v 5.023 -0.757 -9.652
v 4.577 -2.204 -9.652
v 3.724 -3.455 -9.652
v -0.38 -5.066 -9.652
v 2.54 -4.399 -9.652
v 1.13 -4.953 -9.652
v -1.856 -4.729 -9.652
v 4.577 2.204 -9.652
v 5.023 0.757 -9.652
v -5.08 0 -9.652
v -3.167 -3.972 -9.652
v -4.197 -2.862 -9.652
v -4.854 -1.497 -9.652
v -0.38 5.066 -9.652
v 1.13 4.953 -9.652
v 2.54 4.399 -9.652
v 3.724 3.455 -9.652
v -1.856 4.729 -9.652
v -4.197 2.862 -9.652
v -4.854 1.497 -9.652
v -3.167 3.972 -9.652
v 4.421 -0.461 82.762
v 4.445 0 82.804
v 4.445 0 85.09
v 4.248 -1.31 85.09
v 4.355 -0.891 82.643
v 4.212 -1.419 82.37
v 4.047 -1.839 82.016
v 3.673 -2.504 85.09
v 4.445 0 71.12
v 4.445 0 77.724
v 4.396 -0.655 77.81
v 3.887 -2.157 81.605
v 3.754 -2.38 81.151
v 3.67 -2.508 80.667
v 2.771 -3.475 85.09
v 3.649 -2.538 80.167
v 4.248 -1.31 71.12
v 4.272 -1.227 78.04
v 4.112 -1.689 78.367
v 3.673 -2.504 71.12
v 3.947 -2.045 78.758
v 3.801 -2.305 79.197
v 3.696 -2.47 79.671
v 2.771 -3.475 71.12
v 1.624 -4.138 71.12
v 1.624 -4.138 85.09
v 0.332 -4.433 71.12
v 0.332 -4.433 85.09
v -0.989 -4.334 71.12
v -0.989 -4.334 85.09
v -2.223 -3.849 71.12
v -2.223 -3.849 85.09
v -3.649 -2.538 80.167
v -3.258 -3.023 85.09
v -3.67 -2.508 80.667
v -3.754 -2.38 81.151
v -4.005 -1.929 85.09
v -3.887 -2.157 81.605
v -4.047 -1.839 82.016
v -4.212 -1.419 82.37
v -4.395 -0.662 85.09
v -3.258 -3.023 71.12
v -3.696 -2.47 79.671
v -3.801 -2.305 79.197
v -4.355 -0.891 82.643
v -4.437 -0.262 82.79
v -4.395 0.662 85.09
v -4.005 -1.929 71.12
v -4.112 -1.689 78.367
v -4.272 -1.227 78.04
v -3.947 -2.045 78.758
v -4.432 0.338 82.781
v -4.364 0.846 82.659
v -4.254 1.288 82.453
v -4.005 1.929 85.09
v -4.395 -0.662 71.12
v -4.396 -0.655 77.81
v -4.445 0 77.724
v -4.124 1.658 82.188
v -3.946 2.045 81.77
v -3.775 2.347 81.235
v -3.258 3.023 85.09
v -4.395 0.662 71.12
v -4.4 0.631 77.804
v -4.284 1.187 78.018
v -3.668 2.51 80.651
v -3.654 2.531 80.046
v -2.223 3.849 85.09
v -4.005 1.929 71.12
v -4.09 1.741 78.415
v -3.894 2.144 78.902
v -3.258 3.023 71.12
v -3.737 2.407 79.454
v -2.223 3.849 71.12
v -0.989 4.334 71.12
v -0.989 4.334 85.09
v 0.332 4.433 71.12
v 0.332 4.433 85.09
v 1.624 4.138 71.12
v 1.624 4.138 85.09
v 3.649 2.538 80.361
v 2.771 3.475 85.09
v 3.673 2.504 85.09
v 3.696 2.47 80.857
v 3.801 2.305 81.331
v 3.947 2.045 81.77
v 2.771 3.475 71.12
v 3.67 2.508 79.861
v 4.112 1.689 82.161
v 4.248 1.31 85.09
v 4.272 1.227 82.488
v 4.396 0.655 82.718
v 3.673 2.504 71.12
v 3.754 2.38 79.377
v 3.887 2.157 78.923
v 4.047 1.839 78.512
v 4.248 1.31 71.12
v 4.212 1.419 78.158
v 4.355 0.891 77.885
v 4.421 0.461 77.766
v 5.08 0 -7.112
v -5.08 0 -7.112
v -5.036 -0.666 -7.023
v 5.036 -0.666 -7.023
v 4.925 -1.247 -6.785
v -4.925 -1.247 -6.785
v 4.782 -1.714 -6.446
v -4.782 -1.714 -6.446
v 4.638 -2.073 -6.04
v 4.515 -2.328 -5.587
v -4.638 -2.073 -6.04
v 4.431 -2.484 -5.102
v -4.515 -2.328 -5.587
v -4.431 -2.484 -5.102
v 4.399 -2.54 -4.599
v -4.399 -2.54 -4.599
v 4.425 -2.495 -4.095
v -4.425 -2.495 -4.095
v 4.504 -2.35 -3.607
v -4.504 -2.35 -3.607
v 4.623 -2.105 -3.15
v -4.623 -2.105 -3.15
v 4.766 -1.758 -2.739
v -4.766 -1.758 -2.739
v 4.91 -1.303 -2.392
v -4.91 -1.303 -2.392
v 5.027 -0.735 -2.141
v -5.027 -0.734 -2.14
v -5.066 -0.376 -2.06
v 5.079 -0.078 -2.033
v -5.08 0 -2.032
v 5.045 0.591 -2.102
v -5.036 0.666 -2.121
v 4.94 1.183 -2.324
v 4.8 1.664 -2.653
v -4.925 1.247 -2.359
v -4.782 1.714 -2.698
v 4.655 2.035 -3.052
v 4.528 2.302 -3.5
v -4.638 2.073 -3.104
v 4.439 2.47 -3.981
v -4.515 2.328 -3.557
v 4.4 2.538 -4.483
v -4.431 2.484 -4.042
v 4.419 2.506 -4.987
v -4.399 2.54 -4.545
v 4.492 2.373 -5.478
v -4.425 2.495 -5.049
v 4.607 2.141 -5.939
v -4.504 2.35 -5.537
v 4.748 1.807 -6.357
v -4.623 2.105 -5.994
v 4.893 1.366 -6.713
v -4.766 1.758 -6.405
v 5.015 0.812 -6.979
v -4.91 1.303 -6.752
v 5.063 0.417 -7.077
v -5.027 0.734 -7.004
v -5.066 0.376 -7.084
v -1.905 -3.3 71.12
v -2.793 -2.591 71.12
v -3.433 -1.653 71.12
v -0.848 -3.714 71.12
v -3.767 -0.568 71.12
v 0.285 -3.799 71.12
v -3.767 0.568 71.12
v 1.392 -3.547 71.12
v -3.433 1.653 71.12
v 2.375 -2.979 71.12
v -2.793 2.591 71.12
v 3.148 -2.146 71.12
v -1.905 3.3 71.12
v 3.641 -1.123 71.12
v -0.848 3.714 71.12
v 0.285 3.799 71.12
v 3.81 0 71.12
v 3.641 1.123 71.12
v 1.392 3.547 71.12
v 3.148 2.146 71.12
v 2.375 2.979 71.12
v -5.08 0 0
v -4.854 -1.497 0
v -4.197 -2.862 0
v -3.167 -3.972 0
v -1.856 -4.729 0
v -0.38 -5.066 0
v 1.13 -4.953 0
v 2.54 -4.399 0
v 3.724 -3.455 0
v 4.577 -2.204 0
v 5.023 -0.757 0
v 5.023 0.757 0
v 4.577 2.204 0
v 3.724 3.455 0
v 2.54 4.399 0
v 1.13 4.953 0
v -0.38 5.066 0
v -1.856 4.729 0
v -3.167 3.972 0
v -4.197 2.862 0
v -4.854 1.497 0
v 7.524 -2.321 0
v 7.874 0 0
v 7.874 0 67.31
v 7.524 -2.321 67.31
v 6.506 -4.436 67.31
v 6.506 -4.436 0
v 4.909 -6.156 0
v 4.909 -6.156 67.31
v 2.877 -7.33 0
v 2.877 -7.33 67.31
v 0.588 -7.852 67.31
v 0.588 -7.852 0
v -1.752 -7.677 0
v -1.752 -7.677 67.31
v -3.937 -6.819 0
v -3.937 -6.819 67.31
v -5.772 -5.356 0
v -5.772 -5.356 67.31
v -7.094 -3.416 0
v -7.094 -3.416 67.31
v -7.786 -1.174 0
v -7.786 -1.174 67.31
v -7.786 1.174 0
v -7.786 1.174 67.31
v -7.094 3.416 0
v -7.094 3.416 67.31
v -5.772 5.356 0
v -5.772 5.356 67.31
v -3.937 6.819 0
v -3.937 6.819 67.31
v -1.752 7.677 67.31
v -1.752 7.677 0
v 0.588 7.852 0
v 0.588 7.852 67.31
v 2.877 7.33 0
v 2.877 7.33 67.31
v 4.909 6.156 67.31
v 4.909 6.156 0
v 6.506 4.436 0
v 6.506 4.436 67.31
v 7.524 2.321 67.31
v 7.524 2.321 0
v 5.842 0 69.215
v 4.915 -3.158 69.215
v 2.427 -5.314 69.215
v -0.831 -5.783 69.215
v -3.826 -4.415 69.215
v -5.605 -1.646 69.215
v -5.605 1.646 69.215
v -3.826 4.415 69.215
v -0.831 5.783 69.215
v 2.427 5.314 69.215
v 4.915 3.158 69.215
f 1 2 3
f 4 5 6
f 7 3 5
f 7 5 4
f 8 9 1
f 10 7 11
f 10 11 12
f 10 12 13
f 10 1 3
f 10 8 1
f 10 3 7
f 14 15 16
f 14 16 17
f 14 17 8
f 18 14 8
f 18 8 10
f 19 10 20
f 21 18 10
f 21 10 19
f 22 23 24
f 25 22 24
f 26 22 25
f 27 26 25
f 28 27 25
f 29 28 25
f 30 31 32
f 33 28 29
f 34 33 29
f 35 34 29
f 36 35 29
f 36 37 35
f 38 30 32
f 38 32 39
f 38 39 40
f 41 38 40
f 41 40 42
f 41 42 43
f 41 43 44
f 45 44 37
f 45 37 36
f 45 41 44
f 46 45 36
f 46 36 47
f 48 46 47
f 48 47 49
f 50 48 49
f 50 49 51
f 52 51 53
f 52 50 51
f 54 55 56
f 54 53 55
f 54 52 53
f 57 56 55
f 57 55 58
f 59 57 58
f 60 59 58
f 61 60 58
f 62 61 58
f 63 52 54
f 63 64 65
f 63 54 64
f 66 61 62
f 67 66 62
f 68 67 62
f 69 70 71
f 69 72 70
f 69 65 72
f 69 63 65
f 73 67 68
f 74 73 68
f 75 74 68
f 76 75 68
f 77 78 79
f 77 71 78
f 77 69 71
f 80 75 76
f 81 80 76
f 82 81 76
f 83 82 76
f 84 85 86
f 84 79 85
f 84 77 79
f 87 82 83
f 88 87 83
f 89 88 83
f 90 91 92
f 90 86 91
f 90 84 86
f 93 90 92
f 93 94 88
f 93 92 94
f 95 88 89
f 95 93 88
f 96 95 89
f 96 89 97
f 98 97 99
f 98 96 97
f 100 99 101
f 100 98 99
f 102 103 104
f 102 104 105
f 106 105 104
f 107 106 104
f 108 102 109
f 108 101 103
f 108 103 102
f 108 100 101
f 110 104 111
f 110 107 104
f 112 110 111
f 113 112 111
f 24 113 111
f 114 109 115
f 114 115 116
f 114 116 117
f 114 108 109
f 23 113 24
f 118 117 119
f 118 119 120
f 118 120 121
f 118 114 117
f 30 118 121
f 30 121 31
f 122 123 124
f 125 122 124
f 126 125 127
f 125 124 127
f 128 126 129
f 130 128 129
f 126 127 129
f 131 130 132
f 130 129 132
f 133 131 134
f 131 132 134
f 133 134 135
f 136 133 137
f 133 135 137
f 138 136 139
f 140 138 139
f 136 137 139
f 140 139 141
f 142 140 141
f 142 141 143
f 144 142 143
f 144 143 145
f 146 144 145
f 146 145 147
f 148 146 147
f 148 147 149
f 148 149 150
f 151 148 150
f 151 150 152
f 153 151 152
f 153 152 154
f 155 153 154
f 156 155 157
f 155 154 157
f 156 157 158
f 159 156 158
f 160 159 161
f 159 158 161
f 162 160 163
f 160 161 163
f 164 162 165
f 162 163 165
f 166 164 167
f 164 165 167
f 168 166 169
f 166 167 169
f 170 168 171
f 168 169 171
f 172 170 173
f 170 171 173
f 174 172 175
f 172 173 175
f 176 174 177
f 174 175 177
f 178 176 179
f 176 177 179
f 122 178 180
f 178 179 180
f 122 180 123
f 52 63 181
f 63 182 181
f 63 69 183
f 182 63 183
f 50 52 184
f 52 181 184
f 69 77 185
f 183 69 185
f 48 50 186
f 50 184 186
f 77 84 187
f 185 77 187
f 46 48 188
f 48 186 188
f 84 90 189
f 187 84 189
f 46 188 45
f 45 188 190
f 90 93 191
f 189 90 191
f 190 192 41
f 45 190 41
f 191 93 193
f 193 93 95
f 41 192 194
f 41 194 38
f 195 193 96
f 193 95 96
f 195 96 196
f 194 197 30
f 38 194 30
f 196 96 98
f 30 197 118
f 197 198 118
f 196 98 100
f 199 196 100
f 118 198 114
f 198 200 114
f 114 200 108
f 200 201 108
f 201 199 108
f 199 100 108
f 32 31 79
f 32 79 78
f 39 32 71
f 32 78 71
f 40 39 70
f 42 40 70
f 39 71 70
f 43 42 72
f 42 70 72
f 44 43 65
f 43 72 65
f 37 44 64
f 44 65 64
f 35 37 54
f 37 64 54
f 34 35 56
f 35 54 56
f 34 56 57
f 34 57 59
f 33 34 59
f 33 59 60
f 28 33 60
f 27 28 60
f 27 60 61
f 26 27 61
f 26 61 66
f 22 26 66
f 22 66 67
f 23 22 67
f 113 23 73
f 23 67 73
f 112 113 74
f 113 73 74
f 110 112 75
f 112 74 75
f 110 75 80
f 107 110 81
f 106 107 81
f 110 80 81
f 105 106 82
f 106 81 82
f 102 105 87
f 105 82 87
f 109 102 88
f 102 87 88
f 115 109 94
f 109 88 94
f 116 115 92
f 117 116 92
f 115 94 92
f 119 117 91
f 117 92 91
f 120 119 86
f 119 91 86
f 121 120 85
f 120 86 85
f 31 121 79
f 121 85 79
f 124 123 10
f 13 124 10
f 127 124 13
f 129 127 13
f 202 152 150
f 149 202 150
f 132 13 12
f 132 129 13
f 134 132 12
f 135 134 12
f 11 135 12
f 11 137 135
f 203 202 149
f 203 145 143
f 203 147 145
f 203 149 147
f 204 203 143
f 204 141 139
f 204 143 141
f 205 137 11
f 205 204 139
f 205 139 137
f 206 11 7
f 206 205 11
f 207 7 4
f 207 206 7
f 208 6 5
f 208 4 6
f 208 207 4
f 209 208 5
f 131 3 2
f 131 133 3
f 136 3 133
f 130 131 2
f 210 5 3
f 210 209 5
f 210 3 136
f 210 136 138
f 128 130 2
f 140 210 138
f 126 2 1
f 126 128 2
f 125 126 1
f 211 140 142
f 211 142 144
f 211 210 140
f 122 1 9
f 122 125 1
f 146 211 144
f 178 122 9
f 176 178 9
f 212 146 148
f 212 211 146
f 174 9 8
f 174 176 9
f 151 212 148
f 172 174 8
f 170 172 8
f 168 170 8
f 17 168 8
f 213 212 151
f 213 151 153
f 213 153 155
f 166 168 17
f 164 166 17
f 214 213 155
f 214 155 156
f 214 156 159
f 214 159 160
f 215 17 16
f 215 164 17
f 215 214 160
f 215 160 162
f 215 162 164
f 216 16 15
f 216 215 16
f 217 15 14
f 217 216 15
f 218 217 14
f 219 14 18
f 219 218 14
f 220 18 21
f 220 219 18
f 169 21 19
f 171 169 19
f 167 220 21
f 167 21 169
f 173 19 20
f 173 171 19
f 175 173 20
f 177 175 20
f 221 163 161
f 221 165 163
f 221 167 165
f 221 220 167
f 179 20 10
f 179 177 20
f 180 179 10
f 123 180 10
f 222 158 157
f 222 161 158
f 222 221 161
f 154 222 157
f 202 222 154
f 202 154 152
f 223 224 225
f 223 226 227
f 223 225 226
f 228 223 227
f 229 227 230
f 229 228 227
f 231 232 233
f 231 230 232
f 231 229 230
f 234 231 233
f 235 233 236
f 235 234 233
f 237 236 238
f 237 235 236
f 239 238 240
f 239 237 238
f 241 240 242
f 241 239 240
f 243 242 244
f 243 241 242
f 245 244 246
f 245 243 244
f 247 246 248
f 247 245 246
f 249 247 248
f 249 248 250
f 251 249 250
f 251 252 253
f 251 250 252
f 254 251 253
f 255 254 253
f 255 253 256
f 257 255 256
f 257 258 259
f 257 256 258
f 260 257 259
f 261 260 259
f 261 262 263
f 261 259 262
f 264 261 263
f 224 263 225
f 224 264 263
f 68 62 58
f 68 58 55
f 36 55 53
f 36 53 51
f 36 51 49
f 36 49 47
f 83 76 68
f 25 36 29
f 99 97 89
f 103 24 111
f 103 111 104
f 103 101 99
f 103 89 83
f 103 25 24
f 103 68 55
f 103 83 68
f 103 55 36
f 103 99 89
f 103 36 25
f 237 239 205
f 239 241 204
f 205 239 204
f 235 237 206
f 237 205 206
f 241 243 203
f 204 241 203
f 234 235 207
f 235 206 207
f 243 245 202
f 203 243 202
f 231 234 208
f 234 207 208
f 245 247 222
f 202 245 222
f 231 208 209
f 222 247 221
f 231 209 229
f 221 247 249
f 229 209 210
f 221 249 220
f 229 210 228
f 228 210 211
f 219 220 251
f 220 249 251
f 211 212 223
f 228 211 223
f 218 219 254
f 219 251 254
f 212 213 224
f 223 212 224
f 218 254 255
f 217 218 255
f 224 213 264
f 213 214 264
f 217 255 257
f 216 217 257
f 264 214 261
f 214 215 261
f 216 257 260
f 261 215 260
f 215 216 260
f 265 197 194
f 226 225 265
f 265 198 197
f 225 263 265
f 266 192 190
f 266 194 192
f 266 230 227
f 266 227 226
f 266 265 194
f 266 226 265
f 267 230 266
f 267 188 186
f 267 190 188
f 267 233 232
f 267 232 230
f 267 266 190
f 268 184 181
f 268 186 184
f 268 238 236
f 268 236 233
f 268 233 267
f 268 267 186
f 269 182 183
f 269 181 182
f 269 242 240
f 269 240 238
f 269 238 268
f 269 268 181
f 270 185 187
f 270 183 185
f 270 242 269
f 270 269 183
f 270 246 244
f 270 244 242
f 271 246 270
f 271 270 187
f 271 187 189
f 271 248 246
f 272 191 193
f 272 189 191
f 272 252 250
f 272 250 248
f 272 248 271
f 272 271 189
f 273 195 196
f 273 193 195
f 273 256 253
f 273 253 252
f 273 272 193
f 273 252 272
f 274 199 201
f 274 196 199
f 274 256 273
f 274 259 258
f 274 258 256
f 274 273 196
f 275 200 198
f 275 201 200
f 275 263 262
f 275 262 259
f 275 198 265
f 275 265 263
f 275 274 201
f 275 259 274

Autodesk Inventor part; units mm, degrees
ref_plane "YZ Plane" through (0, 0, 0) normal (1, 0, 0) x (0, 1, 0)
ref_plane "XZ Plane" through (0, 0, 0) normal (0, 1, 0) x (-1, 0, 0)
ref_plane "XY Plane" through (0, 0, 0) normal (0, 0, 1) x (1, 0, 0)
sketch "Sketch1" plane through (0, 0, 0) normal (0, 0, 1) x (1, 0, 0)
  circle A0 centre (0, 0) radius 7.874
  dimension "d0" = 15.748
extrude "Extrusion1" add sketch "Sketch1" along normal blind 67.31
ref_plane "Work Plane1" through (0, 0, 71.12) normal (0, 0, 1) x (1, 0, 0)
sketch "Sketch3" plane through (0, 0, 71.12) normal (0, 0, 1) x (1, 0, 0)
  circle A0 centre (0, 0) radius 3.81
  dimension "d4" = 7.62
loft "Loft1" add profiles "Sketch3" section 1 edges at (-7.874, 0, 67.31)
sketch "Sketch4" plane through (0, 0, 71.12) normal (0, 0, 1) x (1, 0, 0)
  circle A0 centre (0, 0) radius 3.81 projected
  circle A1 centre (0, 0) radius 4.445
  dimension "d9" = 8.89
extrude "Extrusion2" add sketch "Sketch4" along normal blind 13.97 contours A0 | A1
sketch "Sketch5" plane through (0, 0, 85.09) normal (0, 0, 1) x (1, 0, 0)
  circle A0 centre (0, 0) radius 4.445 projected
  point P0 (4.445, 0)
ref_plane "Work Plane2" through (4.445, 0, 85.09) normal (1, 0, 0) x (0, 1, 0)
sketch "Sketch6" plane through (4.445, 0, 85.09) normal (1, 0, 0) x (0, 1, 0)
  line L0 (4.445, 0) -> (-4.445, 0) projected
  point P0 (0, -85.09)
  point P1 (0, -4.826)
  dimension "d23" = 4.826
sketch "Sketch7" plane through (0, 0, 0) normal (0, 0, -1) x (-1, 0, 0)
  circle A0 centre (0, 0) radius 5.08
  dimension "d16" = 10.16
extrude "Extrusion4" add sketch "Sketch7" along normal blind 9.652
sketch "Sketch8" plane through (4.445, 0, 85.09) normal (1, 0, 0) x (0, 1, 0)
  line L0 (-5.08, -94.742) -> (5.08, -94.742) projected
  point P0 (0, -85.09)
  point P1 (0, -89.662)
  dimension "d31" = 5.08
hole "Hole1" at (4.445, 0, 80.264) direction (-1, 0, 0) diameter 5.08 end through all
hole "Hole2" at (4.445, 0, -4.572) direction (-1, 0, 0) diameter 5.08 end through all both
properties part number "MockShock"
